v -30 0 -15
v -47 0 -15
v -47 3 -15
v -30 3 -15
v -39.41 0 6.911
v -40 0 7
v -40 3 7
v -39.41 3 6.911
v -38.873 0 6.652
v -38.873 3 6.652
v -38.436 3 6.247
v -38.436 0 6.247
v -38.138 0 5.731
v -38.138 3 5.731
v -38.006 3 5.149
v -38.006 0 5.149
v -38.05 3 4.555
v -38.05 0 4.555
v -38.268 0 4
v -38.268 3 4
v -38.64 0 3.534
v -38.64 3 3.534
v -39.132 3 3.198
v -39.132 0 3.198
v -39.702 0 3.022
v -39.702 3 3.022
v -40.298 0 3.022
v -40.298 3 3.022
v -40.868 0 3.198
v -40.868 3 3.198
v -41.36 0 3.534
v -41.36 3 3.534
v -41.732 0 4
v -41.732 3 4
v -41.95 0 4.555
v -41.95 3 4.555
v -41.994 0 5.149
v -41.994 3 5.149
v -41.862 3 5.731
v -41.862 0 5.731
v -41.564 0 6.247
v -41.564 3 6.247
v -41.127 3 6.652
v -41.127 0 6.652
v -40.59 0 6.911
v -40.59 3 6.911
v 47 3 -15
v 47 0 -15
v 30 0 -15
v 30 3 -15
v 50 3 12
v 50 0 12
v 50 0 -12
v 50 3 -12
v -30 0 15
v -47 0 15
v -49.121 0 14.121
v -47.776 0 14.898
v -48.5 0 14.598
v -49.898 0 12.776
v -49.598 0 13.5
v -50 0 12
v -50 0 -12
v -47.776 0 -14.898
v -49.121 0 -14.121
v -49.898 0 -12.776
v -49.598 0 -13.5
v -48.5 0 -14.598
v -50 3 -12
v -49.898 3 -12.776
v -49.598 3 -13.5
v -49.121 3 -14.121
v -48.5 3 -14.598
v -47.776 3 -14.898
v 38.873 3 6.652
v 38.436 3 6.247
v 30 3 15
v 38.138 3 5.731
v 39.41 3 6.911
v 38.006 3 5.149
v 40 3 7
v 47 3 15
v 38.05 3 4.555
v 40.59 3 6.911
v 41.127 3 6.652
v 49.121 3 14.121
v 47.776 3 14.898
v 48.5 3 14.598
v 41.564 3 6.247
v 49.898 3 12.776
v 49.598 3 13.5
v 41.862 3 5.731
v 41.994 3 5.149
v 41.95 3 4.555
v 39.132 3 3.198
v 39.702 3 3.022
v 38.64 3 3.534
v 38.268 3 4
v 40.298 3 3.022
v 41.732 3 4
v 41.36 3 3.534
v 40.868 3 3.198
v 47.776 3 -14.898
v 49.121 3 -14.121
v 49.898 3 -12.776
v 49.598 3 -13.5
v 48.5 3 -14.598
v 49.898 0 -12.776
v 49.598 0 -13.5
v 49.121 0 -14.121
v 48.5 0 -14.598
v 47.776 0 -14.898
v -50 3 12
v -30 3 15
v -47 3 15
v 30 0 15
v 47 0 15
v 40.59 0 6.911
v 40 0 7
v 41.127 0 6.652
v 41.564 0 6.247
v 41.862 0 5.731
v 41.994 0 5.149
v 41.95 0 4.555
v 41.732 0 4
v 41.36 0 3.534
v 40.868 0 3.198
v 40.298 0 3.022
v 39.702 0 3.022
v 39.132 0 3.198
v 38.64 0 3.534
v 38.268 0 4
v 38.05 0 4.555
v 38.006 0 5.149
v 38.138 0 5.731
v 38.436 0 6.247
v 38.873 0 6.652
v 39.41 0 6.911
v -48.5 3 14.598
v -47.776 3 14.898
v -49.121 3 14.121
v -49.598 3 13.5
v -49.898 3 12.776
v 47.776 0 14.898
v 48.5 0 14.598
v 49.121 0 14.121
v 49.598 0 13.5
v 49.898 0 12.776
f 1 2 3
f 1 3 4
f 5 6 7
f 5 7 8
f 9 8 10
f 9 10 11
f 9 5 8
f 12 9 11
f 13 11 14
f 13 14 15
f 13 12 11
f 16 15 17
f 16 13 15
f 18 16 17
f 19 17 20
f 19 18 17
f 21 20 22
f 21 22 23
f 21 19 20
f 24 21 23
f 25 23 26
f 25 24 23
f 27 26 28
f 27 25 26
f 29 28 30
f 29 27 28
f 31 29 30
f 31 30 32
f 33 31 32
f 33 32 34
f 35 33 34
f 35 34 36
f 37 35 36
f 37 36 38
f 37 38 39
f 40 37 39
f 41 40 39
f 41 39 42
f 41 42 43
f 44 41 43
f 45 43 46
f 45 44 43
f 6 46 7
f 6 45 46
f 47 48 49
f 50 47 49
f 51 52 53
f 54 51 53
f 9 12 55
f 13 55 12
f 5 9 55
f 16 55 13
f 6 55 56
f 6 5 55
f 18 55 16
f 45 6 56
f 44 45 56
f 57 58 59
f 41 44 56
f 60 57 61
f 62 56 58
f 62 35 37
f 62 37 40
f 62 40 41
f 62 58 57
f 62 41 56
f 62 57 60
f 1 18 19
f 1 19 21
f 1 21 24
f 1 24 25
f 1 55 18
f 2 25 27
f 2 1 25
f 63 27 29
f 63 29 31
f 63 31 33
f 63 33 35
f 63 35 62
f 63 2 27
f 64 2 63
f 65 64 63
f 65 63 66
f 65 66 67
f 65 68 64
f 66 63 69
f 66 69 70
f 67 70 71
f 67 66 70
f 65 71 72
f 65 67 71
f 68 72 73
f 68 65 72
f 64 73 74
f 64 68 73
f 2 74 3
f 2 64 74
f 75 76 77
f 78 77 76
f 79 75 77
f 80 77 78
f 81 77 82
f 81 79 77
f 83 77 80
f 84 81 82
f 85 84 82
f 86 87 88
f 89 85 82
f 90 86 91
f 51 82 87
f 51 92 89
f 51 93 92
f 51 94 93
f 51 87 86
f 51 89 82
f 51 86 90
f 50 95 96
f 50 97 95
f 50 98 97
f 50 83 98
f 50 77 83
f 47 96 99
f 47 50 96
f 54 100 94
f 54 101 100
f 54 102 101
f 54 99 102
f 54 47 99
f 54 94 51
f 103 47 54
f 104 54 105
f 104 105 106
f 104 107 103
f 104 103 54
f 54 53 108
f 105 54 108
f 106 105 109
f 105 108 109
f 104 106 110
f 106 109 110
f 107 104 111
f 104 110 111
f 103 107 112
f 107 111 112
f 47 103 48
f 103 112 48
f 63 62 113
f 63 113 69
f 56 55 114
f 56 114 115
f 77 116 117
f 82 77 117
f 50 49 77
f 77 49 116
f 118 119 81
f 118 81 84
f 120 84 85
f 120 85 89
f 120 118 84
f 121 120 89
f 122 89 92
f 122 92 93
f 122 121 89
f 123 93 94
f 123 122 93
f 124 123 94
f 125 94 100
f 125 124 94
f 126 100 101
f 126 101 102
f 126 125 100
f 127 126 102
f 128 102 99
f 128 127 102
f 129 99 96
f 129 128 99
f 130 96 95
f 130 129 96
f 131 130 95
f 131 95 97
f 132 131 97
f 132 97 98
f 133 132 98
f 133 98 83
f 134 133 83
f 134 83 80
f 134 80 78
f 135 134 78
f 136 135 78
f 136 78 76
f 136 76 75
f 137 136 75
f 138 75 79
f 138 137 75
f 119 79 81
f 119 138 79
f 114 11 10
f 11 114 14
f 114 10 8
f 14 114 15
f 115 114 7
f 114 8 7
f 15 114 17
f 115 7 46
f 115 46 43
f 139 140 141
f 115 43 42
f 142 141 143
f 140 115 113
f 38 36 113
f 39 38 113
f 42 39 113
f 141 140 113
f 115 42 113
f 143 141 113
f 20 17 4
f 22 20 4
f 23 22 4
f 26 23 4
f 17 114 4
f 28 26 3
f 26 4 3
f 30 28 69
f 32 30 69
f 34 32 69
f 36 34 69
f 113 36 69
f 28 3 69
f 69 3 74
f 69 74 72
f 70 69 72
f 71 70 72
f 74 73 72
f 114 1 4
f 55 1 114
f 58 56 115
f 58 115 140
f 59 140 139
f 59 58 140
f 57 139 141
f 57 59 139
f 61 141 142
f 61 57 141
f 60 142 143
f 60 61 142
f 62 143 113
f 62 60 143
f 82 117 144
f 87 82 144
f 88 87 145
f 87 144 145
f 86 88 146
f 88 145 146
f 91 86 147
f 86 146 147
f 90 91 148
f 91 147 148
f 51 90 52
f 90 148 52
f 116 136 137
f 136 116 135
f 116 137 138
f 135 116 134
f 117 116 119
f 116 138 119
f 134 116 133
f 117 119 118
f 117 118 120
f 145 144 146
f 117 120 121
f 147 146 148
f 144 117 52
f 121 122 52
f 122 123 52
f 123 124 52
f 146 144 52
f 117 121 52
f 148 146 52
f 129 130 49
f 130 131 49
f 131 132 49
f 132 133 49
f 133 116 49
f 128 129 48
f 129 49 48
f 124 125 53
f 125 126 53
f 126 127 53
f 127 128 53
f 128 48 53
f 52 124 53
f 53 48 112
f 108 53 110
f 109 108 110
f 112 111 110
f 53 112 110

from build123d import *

# Parameters (mm, degrees)
SKETCH_1_R        = 2
EXTRUDE_2_DEPTH   = 3
EXTRUDE_2_2_DEPTH = 3


with BuildPart() as part:
    # 草图1 → 凸台-拉伸2 (new body)
    with BuildSketch(Plane(origin=(0, 0, 0), x_dir=(1, 0, 0), z_dir=(0, 1, 0))):
        with BuildLine():
            Line((-30, 15), (-30, -15))
            Line((-30, -15), (-47, -15))
            ThreePointArc((-47, -15), (-49.121320344, -14.121320344), (-50, -12))
            Line((-50, -12), (-50, 12))
            ThreePointArc((-50, 12), (-49.121320344, 14.121320344), (-47, 15))
            Line((-47, 15), (-30, 15))
        make_face()
        with Locations(Location((-40, -5, 0), (0, 0, 270))):
            Circle(SKETCH_1_R, mode=Mode.SUBTRACT)
    extrude(amount=EXTRUDE_2_DEPTH)


with BuildPart() as body_2:
    # 草图1 → Extrude 2 2 (new body)
    with BuildSketch(Plane(origin=(0, 0, 0), x_dir=(1, 0, 0), z_dir=(0, 1, 0))):
        with BuildLine():
            Line((50, -12), (50, 12))
            ThreePointArc((50, 12), (49.121320344, 14.121320344), (47, 15))
            Line((47, 15), (30, 15))
            Line((30, 15), (30, -15))
            Line((30, -15), (47, -15))
            ThreePointArc((47, -15), (49.121320344, -14.121320344), (50, -12))
        make_face()
        with Locations(Location((40, -5, 0), (0, 0, 270))):
            Circle(SKETCH_1_R, mode=Mode.SUBTRACT)
    extrude(amount=EXTRUDE_2_2_DEPTH)


solid = Compound([part.part, body_2.part])
